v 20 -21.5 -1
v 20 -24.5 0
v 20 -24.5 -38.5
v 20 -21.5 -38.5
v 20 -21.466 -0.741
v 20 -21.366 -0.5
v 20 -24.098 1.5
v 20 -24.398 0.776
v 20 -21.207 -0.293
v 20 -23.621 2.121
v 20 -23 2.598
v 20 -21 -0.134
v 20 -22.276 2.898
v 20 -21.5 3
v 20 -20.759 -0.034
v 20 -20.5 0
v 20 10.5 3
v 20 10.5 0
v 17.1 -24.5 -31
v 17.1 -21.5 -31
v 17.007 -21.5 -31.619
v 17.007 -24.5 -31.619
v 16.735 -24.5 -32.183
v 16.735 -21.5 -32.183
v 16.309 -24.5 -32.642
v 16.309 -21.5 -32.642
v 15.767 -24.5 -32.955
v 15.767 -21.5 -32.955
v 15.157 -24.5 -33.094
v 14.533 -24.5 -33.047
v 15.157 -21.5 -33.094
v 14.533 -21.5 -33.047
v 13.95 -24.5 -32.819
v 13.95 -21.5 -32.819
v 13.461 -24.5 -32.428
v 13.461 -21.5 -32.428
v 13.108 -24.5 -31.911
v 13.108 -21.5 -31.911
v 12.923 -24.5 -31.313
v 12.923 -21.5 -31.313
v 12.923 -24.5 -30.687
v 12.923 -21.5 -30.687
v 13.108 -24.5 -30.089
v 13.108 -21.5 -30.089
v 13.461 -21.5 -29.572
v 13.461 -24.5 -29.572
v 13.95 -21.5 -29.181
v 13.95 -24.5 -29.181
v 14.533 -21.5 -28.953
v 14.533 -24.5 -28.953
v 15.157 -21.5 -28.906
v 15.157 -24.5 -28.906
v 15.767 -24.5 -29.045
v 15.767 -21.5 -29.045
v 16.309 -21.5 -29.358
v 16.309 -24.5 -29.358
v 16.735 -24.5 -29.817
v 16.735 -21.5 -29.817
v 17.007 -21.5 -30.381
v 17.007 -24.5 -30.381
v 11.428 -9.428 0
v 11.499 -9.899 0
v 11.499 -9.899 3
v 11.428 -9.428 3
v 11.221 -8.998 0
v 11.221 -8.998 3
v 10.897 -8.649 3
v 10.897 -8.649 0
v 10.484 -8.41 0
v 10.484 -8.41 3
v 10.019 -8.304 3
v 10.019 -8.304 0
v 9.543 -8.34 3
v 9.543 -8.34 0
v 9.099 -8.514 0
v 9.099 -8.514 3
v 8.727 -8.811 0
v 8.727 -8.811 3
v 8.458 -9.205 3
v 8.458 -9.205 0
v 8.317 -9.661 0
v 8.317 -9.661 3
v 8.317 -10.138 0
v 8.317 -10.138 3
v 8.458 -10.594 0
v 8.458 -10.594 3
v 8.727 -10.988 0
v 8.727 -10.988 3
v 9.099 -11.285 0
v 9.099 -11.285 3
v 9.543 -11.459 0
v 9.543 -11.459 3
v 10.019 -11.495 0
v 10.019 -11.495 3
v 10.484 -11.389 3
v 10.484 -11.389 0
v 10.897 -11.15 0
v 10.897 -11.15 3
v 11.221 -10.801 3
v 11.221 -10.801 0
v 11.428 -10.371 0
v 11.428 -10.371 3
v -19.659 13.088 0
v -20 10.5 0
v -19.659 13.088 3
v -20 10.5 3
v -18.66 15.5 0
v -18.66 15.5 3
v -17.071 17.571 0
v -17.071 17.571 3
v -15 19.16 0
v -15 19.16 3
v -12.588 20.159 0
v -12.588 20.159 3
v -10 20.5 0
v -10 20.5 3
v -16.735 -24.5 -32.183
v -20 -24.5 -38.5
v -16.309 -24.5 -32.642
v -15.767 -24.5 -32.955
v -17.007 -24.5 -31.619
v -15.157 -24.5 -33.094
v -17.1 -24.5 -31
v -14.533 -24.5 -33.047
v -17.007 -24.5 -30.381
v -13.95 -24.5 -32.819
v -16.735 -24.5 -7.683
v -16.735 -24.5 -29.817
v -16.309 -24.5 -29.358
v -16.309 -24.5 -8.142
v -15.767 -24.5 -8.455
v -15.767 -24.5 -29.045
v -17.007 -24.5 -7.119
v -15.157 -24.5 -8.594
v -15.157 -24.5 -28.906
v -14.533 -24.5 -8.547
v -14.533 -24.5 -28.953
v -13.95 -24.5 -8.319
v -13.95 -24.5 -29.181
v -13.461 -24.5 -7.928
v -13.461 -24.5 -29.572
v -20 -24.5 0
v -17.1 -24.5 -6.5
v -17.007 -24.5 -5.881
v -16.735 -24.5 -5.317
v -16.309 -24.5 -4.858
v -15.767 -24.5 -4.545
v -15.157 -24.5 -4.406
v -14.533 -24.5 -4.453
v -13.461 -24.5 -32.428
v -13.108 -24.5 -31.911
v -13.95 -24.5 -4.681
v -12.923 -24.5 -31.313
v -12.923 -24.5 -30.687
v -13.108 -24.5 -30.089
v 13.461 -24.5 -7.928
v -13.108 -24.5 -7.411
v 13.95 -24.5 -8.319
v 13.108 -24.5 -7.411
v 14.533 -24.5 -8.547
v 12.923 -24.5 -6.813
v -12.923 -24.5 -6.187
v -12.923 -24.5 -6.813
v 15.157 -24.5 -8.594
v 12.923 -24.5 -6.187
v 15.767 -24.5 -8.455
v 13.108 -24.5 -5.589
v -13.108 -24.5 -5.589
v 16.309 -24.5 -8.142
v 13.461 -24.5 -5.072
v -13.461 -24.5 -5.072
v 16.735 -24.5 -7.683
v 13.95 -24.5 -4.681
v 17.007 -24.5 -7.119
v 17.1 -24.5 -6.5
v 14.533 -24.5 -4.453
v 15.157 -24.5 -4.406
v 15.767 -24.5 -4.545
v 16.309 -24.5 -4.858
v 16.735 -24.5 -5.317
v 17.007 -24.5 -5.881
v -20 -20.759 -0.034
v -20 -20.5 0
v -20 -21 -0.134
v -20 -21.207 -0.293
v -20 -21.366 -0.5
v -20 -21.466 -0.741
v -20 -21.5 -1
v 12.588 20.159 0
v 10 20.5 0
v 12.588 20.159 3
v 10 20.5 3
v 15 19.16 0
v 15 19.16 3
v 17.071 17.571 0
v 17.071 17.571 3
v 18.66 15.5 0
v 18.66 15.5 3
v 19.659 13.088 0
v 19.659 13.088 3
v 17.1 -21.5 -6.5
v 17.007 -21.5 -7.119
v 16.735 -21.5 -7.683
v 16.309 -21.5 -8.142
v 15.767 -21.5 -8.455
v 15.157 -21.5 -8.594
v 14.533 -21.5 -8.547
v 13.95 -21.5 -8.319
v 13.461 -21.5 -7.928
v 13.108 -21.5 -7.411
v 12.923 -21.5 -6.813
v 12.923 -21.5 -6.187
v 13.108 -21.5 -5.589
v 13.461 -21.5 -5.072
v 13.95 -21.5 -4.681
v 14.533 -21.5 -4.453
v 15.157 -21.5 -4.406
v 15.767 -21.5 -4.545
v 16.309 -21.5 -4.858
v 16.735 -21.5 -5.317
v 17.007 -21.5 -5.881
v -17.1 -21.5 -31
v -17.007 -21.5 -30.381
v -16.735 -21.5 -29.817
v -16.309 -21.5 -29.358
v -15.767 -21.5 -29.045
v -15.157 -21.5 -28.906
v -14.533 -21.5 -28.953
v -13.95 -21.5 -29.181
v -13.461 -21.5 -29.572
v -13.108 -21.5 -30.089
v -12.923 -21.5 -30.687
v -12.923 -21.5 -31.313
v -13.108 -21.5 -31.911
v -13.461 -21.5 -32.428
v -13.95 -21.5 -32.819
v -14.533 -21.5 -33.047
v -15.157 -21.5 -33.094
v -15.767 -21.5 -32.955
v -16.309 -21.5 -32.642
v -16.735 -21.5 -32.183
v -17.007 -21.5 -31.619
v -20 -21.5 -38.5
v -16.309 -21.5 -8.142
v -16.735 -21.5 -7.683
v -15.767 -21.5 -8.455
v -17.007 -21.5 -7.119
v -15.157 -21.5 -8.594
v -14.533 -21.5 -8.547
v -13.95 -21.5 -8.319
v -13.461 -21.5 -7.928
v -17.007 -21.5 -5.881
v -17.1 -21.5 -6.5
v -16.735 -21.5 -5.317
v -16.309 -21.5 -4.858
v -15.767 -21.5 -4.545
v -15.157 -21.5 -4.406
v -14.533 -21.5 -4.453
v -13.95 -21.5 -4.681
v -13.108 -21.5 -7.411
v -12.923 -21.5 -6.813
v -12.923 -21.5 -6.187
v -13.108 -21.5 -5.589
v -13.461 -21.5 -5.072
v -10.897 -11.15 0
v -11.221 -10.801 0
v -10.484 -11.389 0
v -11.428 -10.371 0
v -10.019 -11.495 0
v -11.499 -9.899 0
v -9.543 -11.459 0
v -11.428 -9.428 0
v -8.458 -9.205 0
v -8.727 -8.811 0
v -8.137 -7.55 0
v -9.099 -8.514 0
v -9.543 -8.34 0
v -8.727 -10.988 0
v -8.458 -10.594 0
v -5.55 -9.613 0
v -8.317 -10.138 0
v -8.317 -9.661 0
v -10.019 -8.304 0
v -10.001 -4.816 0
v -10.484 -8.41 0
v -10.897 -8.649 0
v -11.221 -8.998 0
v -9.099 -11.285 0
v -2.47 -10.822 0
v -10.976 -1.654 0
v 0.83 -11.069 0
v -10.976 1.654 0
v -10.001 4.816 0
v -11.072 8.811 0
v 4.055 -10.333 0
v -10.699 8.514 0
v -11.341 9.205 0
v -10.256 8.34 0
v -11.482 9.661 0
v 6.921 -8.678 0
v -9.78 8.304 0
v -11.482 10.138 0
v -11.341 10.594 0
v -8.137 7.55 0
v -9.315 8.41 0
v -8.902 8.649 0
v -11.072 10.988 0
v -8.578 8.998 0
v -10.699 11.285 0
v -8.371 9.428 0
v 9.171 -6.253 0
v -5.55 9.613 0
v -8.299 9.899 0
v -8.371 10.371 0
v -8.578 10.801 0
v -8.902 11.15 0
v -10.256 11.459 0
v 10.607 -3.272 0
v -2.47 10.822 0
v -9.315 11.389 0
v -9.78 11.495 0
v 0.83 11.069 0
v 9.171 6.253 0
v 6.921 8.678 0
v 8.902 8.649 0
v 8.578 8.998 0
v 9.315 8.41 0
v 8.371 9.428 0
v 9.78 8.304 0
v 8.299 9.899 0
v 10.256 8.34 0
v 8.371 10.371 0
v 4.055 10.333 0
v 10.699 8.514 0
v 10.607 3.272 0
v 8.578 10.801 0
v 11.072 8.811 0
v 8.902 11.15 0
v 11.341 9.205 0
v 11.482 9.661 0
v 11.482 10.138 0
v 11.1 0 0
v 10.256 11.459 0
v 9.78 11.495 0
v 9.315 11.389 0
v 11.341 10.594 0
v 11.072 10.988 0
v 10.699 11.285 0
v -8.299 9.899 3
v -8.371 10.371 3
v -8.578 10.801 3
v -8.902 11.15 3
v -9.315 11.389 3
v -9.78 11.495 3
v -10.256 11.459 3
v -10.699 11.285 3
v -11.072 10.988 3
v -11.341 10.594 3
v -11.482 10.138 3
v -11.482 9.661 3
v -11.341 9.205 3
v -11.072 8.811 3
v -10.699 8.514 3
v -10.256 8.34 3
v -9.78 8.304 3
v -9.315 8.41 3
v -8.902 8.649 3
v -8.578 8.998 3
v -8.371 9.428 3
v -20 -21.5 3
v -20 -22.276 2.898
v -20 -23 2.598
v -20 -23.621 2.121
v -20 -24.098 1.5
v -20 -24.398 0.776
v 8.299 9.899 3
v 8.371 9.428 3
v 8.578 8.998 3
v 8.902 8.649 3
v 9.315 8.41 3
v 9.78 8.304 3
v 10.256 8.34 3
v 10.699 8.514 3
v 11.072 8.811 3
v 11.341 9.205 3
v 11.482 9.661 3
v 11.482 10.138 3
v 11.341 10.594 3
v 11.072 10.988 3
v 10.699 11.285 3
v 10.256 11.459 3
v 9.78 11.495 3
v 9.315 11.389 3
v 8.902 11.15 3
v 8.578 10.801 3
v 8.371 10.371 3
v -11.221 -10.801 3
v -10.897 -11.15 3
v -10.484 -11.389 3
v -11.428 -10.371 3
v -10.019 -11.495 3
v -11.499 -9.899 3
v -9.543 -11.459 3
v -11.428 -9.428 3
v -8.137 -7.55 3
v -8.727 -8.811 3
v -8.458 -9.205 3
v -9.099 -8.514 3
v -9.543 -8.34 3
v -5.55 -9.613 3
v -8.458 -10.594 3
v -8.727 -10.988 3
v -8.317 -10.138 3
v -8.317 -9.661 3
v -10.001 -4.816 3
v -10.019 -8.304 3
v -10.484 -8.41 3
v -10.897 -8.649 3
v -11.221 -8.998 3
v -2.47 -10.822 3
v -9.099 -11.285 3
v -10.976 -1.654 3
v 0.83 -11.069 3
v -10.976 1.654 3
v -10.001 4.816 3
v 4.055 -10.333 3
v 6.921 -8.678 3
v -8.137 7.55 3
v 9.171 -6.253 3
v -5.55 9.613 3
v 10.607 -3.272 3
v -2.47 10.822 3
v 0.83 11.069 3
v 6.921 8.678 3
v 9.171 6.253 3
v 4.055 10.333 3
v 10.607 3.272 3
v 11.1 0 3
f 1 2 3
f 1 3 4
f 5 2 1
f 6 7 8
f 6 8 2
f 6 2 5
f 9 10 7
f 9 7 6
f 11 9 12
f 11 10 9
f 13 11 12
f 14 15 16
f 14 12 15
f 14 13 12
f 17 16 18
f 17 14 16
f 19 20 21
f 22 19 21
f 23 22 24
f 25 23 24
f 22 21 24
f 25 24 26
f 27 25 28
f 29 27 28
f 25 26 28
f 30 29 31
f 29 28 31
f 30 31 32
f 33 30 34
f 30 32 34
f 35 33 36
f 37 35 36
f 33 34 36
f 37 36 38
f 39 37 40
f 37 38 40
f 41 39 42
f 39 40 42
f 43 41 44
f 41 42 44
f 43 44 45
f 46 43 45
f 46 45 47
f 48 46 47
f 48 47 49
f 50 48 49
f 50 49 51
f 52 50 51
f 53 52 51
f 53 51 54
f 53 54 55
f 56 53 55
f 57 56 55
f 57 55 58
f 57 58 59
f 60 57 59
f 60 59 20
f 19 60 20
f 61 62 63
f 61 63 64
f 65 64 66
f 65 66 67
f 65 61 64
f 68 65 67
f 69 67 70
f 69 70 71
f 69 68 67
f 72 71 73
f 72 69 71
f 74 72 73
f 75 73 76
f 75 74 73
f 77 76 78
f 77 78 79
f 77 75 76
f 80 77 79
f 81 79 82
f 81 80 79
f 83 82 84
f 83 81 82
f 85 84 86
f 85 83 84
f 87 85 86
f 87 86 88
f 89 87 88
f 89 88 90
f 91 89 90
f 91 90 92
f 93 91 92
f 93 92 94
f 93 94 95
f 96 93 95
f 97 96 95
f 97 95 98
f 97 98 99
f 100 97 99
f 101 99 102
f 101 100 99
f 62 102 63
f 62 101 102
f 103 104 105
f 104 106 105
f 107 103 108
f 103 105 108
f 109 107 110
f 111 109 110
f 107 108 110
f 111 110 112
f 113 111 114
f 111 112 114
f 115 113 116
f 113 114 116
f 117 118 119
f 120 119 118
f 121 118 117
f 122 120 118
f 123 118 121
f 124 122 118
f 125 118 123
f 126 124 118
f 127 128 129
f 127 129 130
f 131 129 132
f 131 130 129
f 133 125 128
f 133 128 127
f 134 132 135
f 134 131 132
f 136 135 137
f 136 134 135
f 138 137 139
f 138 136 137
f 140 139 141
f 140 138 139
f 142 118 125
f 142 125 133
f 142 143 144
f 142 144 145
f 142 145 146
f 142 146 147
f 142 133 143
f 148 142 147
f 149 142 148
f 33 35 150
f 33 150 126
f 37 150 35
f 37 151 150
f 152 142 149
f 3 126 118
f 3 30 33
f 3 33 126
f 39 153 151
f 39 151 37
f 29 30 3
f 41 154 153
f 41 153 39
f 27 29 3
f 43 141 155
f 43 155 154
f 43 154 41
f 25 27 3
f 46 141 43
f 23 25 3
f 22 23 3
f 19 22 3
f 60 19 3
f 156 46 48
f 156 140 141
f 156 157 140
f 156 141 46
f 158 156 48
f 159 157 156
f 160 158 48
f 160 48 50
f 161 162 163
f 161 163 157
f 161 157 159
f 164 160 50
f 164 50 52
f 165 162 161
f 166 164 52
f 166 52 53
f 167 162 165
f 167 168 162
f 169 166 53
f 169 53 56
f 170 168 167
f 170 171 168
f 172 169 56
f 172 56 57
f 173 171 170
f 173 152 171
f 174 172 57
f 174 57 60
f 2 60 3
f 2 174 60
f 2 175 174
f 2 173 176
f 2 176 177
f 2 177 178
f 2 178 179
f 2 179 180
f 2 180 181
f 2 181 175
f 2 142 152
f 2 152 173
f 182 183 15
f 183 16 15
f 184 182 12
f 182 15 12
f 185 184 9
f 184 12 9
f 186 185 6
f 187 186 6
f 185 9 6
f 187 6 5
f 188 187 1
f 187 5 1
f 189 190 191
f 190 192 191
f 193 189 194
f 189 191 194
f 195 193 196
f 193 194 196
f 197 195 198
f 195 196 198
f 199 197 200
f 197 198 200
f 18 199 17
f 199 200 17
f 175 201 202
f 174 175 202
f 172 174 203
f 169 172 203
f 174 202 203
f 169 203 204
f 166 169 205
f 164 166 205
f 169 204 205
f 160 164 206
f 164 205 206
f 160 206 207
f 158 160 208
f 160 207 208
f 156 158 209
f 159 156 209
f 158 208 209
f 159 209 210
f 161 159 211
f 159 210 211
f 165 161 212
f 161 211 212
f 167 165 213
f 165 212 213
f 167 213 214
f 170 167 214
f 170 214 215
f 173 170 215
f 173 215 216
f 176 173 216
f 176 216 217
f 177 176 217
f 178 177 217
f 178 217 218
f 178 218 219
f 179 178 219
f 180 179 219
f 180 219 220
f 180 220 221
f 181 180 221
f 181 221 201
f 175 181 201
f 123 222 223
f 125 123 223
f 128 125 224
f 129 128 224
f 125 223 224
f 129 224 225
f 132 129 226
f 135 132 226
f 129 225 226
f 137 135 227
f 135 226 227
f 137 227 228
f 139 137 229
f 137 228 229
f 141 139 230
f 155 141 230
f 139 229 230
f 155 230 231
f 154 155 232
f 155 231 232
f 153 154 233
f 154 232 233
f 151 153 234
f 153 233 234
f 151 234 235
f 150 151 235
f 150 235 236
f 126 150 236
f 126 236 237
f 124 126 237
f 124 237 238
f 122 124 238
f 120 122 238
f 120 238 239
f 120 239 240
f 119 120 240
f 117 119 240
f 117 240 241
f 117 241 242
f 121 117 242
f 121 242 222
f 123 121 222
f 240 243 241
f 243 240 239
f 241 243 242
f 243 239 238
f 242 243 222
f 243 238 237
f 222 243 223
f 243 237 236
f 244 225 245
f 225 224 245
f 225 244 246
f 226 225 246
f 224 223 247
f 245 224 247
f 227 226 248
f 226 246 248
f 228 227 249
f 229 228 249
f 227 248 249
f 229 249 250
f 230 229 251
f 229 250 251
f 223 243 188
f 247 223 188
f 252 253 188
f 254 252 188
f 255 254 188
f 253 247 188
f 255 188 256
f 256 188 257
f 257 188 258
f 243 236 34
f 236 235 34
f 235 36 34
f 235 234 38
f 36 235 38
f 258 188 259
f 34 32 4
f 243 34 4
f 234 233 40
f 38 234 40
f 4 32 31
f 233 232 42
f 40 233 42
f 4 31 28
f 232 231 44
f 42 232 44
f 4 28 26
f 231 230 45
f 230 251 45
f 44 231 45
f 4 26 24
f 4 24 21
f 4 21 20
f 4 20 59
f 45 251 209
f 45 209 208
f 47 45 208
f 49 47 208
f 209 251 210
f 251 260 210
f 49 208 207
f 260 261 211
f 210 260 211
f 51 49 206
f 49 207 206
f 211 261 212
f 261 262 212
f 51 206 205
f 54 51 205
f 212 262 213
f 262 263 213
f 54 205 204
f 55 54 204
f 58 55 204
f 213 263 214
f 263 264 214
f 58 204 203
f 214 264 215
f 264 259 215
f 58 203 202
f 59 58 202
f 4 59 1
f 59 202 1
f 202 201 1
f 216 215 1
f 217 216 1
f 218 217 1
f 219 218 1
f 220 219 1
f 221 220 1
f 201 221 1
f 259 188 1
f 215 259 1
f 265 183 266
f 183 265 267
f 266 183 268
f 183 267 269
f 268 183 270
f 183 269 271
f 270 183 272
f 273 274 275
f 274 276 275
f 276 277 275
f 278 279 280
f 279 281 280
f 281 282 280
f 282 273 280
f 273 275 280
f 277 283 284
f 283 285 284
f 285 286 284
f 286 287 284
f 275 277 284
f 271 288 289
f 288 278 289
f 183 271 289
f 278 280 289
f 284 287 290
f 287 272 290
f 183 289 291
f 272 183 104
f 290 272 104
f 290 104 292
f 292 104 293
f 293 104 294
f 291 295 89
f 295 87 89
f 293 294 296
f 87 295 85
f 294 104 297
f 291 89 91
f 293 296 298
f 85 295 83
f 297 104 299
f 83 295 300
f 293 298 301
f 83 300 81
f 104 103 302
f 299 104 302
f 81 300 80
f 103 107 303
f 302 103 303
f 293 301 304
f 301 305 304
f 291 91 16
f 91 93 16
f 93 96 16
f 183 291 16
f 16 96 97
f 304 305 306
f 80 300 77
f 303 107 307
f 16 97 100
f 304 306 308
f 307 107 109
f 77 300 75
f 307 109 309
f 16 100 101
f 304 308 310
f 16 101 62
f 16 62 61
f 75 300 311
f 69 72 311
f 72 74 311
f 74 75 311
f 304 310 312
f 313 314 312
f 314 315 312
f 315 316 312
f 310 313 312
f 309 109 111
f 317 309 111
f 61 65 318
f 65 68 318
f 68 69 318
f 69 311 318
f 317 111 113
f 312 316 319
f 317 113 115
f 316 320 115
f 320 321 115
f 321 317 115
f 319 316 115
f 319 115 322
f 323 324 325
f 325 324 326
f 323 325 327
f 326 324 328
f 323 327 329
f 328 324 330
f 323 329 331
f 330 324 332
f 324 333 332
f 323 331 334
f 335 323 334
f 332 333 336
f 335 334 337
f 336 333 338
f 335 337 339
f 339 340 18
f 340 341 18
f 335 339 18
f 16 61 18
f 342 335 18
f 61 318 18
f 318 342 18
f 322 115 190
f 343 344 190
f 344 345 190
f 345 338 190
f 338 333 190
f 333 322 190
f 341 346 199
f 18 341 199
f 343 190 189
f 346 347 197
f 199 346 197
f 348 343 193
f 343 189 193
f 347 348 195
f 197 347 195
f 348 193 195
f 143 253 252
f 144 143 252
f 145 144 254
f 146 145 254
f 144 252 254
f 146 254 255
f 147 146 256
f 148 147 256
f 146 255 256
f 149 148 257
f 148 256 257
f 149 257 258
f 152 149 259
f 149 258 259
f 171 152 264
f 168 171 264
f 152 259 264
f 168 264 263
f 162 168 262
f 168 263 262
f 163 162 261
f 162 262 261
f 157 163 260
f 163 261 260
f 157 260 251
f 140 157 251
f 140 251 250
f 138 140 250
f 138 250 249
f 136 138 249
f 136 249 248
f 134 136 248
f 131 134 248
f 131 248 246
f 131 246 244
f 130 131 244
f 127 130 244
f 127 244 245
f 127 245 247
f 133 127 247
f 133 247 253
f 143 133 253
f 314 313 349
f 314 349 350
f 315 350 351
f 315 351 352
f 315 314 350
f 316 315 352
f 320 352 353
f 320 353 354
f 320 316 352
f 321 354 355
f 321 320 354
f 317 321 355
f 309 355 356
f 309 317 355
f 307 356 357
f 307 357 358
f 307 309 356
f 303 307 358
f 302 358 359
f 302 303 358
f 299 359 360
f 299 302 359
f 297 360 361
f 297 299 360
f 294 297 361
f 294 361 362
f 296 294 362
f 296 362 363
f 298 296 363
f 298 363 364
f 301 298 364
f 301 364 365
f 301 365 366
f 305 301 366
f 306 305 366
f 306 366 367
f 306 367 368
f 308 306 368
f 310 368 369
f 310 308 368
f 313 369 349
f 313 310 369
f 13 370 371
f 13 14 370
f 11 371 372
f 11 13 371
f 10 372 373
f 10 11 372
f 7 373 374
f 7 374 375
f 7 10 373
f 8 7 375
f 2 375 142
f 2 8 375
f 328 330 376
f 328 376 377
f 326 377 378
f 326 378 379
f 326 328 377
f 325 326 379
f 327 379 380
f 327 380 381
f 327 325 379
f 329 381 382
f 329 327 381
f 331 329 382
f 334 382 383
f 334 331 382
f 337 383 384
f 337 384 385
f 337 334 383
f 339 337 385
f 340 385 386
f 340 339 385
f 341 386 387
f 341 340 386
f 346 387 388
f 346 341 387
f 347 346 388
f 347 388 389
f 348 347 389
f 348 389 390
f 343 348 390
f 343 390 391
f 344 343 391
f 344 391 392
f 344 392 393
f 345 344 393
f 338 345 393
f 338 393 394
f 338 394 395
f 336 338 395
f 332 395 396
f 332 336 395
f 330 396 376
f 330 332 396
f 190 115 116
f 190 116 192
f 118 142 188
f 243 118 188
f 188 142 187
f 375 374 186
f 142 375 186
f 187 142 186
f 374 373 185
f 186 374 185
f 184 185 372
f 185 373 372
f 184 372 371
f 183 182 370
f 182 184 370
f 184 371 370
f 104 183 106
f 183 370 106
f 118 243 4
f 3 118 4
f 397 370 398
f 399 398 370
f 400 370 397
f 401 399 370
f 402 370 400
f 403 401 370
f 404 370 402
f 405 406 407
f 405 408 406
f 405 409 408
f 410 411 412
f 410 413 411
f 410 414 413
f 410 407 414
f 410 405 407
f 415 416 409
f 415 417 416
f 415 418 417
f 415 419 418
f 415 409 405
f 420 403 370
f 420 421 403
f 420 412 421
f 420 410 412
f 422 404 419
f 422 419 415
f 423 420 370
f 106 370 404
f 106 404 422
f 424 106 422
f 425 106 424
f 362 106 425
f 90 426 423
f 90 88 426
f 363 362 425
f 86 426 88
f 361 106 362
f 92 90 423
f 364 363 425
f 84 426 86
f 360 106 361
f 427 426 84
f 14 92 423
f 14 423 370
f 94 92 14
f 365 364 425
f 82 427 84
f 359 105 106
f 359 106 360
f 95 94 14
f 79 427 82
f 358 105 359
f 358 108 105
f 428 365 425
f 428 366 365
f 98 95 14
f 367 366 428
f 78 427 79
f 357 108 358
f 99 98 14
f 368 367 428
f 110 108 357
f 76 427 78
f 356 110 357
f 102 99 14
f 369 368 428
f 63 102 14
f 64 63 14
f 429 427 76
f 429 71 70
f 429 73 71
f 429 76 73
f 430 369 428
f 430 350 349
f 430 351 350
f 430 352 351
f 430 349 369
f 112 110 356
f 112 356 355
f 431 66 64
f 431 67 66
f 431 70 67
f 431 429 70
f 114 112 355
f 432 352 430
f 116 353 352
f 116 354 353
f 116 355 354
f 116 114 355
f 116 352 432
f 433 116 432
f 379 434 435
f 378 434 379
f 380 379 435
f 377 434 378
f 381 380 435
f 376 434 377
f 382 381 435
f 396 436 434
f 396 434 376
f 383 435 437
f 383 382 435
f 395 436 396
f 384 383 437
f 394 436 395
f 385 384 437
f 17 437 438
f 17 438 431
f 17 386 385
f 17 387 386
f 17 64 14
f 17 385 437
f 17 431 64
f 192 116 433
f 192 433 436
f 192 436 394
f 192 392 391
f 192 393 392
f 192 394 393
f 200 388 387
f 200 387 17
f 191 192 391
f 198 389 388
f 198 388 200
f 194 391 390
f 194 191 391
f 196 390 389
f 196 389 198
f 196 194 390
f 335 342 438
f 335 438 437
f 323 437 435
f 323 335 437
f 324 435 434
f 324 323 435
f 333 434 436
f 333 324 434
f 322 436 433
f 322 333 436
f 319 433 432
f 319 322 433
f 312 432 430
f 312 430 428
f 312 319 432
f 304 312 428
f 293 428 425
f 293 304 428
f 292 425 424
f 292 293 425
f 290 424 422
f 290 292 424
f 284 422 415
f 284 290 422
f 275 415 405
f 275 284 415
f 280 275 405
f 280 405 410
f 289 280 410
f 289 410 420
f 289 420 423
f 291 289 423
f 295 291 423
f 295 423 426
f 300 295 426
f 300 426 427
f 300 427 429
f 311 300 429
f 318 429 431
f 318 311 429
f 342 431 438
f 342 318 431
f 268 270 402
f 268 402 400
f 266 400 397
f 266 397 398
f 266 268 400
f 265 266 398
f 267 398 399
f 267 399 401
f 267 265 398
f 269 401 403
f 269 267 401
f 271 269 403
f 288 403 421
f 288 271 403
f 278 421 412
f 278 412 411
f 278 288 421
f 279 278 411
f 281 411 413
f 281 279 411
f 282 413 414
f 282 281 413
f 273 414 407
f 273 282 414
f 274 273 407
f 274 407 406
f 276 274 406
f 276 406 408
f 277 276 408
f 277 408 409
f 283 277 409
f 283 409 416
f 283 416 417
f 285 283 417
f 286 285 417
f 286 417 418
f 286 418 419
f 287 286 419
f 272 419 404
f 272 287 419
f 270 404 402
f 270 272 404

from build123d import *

# Parameters (mm, degrees)
SKETCH_1_W          = 40
SKETCH_1_H          = 45
SKETCH_1_R          = 11.1
SKETCH_1_R_2        = 1.6
EXTRUDE_1_DEPTH     = 3
SKETCH_2_W          = 40
SKETCH_2_H          = 3
EXTRUDE_2_DEPTH     = 41.5
SKETCH_3_R          = 2.1
CUT_EXTRUDE_1_DEPTH = 61.384186672
FILLET_1_R          = 10
FILLET_3_R          = 3
FILLET_4_R          = 1


with BuildPart() as part:
    # 草图1 → 凸台-拉伸1 (new body)
    with BuildSketch(Plane.XY):
        with Locations((0, -2)):
            Rectangle(SKETCH_1_W, SKETCH_1_H)
        Circle(SKETCH_1_R, mode=Mode.SUBTRACT)
        with Locations((-9.899494937, 9.899494937)):
            Circle(SKETCH_1_R_2, mode=Mode.SUBTRACT)
        with Locations(Location((9.899494937, 9.899494937, 0), (0, 0, 180))):
            Circle(SKETCH_1_R_2, mode=Mode.SUBTRACT)
        with Locations(Location((-9.899494937, -9.899494937, 0), (0, 0, 180))):
            Circle(SKETCH_1_R_2, mode=Mode.SUBTRACT)
        with Locations((9.899494937, -9.899494937)):
            Circle(SKETCH_1_R_2, mode=Mode.SUBTRACT)
    extrude(amount=EXTRUDE_1_DEPTH)

    # 草图2 → 凸台-拉伸2 (add)
    with BuildSketch(Plane.XY.offset(3)):
        with Locations((0, -23)):
            Rectangle(SKETCH_2_W, SKETCH_2_H)
    extrude(amount=-EXTRUDE_2_DEPTH)

    # 草图3 → 切除-拉伸1 (cut, through all)
    with BuildSketch(Plane(origin=(0, -21.5, 0), x_dir=(1, 0, 0), z_dir=(0, 1, 0))):
        with Locations(Location((-15, 31, 0), (0, 0, 180))):
            Circle(SKETCH_3_R)
        with Locations((15, 31)):
            Circle(SKETCH_3_R)
        with Locations((15, 6.5)):
            Circle(SKETCH_3_R)
        with Locations(Location((-15, 6.5, 0), (0, 0, 180))):
            Circle(SKETCH_3_R)
    extrude(amount=-CUT_EXTRUDE_1_DEPTH, mode=Mode.SUBTRACT)

    # 圆角1
    fillet_1_edges = [part.edges().sort_by_distance(p)[0] for p in [
        (-20, 20.5, 1.5),
        (20, 20.5, 1.5),
    ]]
    fillet(fillet_1_edges, radius=FILLET_1_R)

    # 圆角3
    fillet_3_edges = [part.edges().sort_by_distance(p)[0] for p in [
        (0, -24.5, 3),
    ]]
    fillet(fillet_3_edges, radius=FILLET_3_R)

    # 圆角4
    fillet_4_edges = [part.edges().sort_by_distance(p)[0] for p in [
        (0, -21.5, 0),
    ]]
    fillet(fillet_4_edges, radius=FILLET_4_R)


solid = part.part
